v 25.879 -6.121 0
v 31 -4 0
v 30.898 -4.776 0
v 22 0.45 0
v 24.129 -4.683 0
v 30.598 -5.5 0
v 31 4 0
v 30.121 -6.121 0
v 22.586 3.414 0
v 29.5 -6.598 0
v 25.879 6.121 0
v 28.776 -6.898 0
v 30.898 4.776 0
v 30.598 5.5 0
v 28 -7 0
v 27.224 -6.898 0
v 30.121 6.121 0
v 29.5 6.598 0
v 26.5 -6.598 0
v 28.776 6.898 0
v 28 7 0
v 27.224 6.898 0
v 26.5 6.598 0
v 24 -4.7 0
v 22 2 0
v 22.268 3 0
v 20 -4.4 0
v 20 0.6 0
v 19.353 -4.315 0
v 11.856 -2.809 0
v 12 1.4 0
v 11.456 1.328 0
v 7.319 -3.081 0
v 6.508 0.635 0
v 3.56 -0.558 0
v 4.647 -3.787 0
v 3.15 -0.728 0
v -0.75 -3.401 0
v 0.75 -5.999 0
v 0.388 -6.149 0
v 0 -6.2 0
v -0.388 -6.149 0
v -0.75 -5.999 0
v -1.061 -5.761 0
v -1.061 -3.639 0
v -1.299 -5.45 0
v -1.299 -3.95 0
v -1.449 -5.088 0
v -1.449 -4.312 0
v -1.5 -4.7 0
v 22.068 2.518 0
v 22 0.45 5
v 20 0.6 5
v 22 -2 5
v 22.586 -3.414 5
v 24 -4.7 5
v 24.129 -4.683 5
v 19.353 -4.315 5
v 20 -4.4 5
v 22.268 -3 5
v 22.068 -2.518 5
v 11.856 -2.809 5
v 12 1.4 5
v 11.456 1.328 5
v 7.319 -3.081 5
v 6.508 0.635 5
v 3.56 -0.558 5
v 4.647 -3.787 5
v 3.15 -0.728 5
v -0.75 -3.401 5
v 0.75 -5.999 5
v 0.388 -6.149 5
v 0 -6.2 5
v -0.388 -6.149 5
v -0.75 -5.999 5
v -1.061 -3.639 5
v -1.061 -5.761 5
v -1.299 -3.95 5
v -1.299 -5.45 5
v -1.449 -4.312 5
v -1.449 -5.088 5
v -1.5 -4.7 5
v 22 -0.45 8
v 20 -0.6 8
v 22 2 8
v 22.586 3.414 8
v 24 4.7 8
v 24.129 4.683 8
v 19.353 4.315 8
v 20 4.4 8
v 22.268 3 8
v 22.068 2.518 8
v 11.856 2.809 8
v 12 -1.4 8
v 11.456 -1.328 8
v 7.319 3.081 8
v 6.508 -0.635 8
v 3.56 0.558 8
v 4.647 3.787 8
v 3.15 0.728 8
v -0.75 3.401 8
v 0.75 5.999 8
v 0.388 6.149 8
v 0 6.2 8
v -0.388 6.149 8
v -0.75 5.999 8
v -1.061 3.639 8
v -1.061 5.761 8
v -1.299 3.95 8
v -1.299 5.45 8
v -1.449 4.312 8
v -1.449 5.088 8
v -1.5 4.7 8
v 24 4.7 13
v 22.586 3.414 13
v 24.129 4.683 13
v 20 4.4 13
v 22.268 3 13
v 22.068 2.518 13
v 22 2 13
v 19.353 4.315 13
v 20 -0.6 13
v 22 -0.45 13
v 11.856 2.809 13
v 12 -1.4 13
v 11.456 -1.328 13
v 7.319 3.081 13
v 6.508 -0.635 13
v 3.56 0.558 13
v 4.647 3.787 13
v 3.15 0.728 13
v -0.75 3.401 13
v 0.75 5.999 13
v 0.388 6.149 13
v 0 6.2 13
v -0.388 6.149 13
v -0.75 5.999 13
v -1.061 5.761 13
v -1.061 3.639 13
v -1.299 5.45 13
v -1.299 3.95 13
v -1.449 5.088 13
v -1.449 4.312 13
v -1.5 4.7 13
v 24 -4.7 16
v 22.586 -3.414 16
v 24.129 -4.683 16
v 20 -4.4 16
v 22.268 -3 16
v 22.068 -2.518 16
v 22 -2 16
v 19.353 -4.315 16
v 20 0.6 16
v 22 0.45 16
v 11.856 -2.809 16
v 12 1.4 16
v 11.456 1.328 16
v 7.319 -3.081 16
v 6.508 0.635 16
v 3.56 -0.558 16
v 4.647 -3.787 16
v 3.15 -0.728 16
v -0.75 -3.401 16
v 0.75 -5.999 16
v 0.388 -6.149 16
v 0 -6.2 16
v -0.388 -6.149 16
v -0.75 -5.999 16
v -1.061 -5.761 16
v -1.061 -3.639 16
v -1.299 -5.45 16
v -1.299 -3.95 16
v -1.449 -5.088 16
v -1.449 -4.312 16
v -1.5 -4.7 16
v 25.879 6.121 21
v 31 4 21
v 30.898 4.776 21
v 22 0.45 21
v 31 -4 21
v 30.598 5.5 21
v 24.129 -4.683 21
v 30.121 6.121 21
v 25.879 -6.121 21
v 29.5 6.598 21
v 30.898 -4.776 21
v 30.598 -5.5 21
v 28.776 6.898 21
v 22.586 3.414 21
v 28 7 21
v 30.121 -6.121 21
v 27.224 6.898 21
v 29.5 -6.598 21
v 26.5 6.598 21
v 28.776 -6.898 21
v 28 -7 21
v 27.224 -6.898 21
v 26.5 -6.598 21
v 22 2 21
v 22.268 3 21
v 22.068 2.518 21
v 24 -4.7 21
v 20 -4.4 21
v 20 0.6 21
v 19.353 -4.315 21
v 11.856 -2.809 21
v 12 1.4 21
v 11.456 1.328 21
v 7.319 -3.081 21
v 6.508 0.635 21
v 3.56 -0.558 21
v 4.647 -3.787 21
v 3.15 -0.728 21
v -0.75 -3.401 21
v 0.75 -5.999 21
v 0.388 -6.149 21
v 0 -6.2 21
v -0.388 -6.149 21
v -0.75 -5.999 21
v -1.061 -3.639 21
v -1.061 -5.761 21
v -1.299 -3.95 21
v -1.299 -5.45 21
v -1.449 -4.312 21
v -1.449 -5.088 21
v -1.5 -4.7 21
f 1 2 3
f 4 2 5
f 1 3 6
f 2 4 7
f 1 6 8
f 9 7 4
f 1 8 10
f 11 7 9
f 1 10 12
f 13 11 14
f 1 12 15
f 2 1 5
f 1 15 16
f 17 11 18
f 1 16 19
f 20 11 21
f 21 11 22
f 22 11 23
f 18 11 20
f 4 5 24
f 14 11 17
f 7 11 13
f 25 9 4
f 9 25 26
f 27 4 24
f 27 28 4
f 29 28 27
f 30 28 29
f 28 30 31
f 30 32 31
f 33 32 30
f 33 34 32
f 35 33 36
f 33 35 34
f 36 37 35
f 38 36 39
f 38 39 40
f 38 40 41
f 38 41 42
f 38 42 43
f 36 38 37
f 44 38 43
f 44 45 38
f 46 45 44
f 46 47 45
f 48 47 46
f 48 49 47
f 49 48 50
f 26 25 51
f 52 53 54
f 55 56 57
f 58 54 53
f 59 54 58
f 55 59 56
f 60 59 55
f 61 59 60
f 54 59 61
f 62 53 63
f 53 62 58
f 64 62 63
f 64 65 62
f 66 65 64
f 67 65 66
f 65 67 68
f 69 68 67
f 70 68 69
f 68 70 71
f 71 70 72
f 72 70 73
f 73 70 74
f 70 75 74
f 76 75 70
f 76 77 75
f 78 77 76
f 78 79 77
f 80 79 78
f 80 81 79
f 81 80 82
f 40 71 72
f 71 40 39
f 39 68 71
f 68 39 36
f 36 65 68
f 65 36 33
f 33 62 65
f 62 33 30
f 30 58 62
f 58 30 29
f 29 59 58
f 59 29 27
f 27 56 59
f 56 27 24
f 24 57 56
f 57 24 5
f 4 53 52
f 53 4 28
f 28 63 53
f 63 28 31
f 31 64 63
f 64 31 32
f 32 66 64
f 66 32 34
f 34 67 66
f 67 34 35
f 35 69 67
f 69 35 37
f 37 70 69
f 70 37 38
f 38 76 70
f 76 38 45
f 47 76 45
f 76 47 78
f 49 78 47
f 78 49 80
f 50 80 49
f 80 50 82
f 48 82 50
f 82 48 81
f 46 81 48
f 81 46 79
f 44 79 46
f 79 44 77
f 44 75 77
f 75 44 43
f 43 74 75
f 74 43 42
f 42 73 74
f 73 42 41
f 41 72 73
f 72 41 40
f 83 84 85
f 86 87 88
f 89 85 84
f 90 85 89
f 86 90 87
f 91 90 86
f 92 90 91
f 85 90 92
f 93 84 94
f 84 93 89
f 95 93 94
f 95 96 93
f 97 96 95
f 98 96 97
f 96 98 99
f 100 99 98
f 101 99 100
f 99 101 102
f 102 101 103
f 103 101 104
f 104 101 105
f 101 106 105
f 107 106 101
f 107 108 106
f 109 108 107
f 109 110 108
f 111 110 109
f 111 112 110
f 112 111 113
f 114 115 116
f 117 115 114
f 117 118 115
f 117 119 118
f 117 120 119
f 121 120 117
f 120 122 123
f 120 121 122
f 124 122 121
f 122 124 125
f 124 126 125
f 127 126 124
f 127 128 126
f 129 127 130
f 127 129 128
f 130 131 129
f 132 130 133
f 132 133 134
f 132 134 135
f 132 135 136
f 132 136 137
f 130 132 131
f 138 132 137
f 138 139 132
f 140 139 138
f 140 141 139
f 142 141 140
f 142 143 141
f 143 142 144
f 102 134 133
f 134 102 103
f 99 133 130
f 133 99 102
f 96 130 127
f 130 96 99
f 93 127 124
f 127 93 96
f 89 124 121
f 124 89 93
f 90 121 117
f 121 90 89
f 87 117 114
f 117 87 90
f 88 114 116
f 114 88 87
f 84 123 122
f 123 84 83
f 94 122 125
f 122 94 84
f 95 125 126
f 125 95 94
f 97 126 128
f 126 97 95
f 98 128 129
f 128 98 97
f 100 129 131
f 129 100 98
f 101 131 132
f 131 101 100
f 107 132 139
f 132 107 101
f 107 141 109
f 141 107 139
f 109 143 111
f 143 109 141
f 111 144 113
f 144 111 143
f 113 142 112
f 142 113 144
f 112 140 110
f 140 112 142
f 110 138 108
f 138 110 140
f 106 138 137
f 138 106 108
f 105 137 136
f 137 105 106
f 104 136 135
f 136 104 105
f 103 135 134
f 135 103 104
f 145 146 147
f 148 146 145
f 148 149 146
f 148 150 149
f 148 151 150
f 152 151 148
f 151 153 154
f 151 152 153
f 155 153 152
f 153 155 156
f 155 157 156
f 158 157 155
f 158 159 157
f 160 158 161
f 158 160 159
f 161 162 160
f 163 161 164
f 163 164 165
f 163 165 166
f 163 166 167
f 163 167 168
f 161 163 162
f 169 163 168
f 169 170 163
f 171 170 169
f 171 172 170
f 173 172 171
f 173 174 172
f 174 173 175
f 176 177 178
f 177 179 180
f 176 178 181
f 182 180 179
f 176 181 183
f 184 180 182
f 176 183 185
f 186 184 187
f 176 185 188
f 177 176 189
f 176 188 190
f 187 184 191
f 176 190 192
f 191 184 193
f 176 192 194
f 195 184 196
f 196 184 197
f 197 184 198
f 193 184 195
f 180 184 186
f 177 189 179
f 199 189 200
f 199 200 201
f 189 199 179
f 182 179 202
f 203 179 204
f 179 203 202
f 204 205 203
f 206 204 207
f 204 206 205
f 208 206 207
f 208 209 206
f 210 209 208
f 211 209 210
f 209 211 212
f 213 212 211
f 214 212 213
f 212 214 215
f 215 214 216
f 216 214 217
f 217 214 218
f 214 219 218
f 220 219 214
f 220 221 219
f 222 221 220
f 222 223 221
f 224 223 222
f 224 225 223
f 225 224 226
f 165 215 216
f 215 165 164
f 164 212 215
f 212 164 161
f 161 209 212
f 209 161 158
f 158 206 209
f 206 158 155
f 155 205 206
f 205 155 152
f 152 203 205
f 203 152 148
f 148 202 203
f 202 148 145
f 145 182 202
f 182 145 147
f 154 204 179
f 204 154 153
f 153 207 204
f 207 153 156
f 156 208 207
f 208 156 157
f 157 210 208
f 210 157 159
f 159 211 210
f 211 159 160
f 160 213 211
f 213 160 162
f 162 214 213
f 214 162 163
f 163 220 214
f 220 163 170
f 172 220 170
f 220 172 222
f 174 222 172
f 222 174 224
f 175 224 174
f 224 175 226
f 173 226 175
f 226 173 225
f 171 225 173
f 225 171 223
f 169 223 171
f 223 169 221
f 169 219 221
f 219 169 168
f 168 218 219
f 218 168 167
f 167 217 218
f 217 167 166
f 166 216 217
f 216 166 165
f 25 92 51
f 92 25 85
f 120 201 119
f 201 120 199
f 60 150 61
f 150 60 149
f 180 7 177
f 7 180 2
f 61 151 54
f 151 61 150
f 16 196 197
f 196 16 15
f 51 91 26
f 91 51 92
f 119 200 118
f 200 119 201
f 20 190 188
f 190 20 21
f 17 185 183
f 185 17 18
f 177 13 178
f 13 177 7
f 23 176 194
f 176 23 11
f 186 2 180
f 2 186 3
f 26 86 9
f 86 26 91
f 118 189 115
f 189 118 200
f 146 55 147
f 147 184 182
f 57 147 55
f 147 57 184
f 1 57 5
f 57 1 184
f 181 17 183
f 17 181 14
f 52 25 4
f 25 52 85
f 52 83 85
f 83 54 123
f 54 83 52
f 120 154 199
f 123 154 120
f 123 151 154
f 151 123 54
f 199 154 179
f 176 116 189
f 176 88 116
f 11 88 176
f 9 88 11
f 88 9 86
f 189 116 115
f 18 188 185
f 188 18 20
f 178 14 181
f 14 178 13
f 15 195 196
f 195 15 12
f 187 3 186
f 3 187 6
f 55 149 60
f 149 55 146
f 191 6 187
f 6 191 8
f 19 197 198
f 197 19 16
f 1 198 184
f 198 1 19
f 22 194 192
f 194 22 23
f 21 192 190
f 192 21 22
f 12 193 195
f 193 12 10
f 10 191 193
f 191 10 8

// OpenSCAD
module dualCircleHull(t1, r1, t2, r2) {
  hull() {
    translate(t1)
    circle(r1);
    
    translate(t2)
    circle(r2);
  }
}

module finFlat() {
  $fn=24;
  radius=1.5;
  
  union() {    
    dualCircleHull(
      [0,-0.5,0], 1.5,
      [4,2,0], 1.7
    );

    dualCircleHull(
      [4,2,0], 1.7,
      [7,3,0], 1.9
    );
    
    dualCircleHull(
      [7,3,0], 1.9,
      [12,3.5,0], 2.1
    );
    
    dualCircleHull(
      [12,3.5,0], 2.1,
      [20,2.3,0], 2.5
    );
    
    dualCircleHull(
      [20,2.3,0], 2.5,
      [24,2,0], 2.5
    );
  }  
}

module finExtruded(h=5){
  translate([0,-4.2,0])
  linear_extrude(height=h)
    finFlat();
}

module handleFlat(){
  $fn=24;
  hull() {
    dualCircleHull(
      [0,2,0], 2,
      [0,-2,0], 2
    );
    
    dualCircleHull(
      [4,4,0], 3,
      [4,-4,0], 3
    );
  }
}

module handleExtruded(h=21){
  translate([24,0,0])
  linear_extrude(height=h)
    handleFlat();
}

union() {
  finExtruded();

  translate([0,0,5+3])
  mirror([0,1,0])
  finExtruded();

  translate([0,0,(5+3)*2])
  finExtruded();

  handleExtruded();
}
